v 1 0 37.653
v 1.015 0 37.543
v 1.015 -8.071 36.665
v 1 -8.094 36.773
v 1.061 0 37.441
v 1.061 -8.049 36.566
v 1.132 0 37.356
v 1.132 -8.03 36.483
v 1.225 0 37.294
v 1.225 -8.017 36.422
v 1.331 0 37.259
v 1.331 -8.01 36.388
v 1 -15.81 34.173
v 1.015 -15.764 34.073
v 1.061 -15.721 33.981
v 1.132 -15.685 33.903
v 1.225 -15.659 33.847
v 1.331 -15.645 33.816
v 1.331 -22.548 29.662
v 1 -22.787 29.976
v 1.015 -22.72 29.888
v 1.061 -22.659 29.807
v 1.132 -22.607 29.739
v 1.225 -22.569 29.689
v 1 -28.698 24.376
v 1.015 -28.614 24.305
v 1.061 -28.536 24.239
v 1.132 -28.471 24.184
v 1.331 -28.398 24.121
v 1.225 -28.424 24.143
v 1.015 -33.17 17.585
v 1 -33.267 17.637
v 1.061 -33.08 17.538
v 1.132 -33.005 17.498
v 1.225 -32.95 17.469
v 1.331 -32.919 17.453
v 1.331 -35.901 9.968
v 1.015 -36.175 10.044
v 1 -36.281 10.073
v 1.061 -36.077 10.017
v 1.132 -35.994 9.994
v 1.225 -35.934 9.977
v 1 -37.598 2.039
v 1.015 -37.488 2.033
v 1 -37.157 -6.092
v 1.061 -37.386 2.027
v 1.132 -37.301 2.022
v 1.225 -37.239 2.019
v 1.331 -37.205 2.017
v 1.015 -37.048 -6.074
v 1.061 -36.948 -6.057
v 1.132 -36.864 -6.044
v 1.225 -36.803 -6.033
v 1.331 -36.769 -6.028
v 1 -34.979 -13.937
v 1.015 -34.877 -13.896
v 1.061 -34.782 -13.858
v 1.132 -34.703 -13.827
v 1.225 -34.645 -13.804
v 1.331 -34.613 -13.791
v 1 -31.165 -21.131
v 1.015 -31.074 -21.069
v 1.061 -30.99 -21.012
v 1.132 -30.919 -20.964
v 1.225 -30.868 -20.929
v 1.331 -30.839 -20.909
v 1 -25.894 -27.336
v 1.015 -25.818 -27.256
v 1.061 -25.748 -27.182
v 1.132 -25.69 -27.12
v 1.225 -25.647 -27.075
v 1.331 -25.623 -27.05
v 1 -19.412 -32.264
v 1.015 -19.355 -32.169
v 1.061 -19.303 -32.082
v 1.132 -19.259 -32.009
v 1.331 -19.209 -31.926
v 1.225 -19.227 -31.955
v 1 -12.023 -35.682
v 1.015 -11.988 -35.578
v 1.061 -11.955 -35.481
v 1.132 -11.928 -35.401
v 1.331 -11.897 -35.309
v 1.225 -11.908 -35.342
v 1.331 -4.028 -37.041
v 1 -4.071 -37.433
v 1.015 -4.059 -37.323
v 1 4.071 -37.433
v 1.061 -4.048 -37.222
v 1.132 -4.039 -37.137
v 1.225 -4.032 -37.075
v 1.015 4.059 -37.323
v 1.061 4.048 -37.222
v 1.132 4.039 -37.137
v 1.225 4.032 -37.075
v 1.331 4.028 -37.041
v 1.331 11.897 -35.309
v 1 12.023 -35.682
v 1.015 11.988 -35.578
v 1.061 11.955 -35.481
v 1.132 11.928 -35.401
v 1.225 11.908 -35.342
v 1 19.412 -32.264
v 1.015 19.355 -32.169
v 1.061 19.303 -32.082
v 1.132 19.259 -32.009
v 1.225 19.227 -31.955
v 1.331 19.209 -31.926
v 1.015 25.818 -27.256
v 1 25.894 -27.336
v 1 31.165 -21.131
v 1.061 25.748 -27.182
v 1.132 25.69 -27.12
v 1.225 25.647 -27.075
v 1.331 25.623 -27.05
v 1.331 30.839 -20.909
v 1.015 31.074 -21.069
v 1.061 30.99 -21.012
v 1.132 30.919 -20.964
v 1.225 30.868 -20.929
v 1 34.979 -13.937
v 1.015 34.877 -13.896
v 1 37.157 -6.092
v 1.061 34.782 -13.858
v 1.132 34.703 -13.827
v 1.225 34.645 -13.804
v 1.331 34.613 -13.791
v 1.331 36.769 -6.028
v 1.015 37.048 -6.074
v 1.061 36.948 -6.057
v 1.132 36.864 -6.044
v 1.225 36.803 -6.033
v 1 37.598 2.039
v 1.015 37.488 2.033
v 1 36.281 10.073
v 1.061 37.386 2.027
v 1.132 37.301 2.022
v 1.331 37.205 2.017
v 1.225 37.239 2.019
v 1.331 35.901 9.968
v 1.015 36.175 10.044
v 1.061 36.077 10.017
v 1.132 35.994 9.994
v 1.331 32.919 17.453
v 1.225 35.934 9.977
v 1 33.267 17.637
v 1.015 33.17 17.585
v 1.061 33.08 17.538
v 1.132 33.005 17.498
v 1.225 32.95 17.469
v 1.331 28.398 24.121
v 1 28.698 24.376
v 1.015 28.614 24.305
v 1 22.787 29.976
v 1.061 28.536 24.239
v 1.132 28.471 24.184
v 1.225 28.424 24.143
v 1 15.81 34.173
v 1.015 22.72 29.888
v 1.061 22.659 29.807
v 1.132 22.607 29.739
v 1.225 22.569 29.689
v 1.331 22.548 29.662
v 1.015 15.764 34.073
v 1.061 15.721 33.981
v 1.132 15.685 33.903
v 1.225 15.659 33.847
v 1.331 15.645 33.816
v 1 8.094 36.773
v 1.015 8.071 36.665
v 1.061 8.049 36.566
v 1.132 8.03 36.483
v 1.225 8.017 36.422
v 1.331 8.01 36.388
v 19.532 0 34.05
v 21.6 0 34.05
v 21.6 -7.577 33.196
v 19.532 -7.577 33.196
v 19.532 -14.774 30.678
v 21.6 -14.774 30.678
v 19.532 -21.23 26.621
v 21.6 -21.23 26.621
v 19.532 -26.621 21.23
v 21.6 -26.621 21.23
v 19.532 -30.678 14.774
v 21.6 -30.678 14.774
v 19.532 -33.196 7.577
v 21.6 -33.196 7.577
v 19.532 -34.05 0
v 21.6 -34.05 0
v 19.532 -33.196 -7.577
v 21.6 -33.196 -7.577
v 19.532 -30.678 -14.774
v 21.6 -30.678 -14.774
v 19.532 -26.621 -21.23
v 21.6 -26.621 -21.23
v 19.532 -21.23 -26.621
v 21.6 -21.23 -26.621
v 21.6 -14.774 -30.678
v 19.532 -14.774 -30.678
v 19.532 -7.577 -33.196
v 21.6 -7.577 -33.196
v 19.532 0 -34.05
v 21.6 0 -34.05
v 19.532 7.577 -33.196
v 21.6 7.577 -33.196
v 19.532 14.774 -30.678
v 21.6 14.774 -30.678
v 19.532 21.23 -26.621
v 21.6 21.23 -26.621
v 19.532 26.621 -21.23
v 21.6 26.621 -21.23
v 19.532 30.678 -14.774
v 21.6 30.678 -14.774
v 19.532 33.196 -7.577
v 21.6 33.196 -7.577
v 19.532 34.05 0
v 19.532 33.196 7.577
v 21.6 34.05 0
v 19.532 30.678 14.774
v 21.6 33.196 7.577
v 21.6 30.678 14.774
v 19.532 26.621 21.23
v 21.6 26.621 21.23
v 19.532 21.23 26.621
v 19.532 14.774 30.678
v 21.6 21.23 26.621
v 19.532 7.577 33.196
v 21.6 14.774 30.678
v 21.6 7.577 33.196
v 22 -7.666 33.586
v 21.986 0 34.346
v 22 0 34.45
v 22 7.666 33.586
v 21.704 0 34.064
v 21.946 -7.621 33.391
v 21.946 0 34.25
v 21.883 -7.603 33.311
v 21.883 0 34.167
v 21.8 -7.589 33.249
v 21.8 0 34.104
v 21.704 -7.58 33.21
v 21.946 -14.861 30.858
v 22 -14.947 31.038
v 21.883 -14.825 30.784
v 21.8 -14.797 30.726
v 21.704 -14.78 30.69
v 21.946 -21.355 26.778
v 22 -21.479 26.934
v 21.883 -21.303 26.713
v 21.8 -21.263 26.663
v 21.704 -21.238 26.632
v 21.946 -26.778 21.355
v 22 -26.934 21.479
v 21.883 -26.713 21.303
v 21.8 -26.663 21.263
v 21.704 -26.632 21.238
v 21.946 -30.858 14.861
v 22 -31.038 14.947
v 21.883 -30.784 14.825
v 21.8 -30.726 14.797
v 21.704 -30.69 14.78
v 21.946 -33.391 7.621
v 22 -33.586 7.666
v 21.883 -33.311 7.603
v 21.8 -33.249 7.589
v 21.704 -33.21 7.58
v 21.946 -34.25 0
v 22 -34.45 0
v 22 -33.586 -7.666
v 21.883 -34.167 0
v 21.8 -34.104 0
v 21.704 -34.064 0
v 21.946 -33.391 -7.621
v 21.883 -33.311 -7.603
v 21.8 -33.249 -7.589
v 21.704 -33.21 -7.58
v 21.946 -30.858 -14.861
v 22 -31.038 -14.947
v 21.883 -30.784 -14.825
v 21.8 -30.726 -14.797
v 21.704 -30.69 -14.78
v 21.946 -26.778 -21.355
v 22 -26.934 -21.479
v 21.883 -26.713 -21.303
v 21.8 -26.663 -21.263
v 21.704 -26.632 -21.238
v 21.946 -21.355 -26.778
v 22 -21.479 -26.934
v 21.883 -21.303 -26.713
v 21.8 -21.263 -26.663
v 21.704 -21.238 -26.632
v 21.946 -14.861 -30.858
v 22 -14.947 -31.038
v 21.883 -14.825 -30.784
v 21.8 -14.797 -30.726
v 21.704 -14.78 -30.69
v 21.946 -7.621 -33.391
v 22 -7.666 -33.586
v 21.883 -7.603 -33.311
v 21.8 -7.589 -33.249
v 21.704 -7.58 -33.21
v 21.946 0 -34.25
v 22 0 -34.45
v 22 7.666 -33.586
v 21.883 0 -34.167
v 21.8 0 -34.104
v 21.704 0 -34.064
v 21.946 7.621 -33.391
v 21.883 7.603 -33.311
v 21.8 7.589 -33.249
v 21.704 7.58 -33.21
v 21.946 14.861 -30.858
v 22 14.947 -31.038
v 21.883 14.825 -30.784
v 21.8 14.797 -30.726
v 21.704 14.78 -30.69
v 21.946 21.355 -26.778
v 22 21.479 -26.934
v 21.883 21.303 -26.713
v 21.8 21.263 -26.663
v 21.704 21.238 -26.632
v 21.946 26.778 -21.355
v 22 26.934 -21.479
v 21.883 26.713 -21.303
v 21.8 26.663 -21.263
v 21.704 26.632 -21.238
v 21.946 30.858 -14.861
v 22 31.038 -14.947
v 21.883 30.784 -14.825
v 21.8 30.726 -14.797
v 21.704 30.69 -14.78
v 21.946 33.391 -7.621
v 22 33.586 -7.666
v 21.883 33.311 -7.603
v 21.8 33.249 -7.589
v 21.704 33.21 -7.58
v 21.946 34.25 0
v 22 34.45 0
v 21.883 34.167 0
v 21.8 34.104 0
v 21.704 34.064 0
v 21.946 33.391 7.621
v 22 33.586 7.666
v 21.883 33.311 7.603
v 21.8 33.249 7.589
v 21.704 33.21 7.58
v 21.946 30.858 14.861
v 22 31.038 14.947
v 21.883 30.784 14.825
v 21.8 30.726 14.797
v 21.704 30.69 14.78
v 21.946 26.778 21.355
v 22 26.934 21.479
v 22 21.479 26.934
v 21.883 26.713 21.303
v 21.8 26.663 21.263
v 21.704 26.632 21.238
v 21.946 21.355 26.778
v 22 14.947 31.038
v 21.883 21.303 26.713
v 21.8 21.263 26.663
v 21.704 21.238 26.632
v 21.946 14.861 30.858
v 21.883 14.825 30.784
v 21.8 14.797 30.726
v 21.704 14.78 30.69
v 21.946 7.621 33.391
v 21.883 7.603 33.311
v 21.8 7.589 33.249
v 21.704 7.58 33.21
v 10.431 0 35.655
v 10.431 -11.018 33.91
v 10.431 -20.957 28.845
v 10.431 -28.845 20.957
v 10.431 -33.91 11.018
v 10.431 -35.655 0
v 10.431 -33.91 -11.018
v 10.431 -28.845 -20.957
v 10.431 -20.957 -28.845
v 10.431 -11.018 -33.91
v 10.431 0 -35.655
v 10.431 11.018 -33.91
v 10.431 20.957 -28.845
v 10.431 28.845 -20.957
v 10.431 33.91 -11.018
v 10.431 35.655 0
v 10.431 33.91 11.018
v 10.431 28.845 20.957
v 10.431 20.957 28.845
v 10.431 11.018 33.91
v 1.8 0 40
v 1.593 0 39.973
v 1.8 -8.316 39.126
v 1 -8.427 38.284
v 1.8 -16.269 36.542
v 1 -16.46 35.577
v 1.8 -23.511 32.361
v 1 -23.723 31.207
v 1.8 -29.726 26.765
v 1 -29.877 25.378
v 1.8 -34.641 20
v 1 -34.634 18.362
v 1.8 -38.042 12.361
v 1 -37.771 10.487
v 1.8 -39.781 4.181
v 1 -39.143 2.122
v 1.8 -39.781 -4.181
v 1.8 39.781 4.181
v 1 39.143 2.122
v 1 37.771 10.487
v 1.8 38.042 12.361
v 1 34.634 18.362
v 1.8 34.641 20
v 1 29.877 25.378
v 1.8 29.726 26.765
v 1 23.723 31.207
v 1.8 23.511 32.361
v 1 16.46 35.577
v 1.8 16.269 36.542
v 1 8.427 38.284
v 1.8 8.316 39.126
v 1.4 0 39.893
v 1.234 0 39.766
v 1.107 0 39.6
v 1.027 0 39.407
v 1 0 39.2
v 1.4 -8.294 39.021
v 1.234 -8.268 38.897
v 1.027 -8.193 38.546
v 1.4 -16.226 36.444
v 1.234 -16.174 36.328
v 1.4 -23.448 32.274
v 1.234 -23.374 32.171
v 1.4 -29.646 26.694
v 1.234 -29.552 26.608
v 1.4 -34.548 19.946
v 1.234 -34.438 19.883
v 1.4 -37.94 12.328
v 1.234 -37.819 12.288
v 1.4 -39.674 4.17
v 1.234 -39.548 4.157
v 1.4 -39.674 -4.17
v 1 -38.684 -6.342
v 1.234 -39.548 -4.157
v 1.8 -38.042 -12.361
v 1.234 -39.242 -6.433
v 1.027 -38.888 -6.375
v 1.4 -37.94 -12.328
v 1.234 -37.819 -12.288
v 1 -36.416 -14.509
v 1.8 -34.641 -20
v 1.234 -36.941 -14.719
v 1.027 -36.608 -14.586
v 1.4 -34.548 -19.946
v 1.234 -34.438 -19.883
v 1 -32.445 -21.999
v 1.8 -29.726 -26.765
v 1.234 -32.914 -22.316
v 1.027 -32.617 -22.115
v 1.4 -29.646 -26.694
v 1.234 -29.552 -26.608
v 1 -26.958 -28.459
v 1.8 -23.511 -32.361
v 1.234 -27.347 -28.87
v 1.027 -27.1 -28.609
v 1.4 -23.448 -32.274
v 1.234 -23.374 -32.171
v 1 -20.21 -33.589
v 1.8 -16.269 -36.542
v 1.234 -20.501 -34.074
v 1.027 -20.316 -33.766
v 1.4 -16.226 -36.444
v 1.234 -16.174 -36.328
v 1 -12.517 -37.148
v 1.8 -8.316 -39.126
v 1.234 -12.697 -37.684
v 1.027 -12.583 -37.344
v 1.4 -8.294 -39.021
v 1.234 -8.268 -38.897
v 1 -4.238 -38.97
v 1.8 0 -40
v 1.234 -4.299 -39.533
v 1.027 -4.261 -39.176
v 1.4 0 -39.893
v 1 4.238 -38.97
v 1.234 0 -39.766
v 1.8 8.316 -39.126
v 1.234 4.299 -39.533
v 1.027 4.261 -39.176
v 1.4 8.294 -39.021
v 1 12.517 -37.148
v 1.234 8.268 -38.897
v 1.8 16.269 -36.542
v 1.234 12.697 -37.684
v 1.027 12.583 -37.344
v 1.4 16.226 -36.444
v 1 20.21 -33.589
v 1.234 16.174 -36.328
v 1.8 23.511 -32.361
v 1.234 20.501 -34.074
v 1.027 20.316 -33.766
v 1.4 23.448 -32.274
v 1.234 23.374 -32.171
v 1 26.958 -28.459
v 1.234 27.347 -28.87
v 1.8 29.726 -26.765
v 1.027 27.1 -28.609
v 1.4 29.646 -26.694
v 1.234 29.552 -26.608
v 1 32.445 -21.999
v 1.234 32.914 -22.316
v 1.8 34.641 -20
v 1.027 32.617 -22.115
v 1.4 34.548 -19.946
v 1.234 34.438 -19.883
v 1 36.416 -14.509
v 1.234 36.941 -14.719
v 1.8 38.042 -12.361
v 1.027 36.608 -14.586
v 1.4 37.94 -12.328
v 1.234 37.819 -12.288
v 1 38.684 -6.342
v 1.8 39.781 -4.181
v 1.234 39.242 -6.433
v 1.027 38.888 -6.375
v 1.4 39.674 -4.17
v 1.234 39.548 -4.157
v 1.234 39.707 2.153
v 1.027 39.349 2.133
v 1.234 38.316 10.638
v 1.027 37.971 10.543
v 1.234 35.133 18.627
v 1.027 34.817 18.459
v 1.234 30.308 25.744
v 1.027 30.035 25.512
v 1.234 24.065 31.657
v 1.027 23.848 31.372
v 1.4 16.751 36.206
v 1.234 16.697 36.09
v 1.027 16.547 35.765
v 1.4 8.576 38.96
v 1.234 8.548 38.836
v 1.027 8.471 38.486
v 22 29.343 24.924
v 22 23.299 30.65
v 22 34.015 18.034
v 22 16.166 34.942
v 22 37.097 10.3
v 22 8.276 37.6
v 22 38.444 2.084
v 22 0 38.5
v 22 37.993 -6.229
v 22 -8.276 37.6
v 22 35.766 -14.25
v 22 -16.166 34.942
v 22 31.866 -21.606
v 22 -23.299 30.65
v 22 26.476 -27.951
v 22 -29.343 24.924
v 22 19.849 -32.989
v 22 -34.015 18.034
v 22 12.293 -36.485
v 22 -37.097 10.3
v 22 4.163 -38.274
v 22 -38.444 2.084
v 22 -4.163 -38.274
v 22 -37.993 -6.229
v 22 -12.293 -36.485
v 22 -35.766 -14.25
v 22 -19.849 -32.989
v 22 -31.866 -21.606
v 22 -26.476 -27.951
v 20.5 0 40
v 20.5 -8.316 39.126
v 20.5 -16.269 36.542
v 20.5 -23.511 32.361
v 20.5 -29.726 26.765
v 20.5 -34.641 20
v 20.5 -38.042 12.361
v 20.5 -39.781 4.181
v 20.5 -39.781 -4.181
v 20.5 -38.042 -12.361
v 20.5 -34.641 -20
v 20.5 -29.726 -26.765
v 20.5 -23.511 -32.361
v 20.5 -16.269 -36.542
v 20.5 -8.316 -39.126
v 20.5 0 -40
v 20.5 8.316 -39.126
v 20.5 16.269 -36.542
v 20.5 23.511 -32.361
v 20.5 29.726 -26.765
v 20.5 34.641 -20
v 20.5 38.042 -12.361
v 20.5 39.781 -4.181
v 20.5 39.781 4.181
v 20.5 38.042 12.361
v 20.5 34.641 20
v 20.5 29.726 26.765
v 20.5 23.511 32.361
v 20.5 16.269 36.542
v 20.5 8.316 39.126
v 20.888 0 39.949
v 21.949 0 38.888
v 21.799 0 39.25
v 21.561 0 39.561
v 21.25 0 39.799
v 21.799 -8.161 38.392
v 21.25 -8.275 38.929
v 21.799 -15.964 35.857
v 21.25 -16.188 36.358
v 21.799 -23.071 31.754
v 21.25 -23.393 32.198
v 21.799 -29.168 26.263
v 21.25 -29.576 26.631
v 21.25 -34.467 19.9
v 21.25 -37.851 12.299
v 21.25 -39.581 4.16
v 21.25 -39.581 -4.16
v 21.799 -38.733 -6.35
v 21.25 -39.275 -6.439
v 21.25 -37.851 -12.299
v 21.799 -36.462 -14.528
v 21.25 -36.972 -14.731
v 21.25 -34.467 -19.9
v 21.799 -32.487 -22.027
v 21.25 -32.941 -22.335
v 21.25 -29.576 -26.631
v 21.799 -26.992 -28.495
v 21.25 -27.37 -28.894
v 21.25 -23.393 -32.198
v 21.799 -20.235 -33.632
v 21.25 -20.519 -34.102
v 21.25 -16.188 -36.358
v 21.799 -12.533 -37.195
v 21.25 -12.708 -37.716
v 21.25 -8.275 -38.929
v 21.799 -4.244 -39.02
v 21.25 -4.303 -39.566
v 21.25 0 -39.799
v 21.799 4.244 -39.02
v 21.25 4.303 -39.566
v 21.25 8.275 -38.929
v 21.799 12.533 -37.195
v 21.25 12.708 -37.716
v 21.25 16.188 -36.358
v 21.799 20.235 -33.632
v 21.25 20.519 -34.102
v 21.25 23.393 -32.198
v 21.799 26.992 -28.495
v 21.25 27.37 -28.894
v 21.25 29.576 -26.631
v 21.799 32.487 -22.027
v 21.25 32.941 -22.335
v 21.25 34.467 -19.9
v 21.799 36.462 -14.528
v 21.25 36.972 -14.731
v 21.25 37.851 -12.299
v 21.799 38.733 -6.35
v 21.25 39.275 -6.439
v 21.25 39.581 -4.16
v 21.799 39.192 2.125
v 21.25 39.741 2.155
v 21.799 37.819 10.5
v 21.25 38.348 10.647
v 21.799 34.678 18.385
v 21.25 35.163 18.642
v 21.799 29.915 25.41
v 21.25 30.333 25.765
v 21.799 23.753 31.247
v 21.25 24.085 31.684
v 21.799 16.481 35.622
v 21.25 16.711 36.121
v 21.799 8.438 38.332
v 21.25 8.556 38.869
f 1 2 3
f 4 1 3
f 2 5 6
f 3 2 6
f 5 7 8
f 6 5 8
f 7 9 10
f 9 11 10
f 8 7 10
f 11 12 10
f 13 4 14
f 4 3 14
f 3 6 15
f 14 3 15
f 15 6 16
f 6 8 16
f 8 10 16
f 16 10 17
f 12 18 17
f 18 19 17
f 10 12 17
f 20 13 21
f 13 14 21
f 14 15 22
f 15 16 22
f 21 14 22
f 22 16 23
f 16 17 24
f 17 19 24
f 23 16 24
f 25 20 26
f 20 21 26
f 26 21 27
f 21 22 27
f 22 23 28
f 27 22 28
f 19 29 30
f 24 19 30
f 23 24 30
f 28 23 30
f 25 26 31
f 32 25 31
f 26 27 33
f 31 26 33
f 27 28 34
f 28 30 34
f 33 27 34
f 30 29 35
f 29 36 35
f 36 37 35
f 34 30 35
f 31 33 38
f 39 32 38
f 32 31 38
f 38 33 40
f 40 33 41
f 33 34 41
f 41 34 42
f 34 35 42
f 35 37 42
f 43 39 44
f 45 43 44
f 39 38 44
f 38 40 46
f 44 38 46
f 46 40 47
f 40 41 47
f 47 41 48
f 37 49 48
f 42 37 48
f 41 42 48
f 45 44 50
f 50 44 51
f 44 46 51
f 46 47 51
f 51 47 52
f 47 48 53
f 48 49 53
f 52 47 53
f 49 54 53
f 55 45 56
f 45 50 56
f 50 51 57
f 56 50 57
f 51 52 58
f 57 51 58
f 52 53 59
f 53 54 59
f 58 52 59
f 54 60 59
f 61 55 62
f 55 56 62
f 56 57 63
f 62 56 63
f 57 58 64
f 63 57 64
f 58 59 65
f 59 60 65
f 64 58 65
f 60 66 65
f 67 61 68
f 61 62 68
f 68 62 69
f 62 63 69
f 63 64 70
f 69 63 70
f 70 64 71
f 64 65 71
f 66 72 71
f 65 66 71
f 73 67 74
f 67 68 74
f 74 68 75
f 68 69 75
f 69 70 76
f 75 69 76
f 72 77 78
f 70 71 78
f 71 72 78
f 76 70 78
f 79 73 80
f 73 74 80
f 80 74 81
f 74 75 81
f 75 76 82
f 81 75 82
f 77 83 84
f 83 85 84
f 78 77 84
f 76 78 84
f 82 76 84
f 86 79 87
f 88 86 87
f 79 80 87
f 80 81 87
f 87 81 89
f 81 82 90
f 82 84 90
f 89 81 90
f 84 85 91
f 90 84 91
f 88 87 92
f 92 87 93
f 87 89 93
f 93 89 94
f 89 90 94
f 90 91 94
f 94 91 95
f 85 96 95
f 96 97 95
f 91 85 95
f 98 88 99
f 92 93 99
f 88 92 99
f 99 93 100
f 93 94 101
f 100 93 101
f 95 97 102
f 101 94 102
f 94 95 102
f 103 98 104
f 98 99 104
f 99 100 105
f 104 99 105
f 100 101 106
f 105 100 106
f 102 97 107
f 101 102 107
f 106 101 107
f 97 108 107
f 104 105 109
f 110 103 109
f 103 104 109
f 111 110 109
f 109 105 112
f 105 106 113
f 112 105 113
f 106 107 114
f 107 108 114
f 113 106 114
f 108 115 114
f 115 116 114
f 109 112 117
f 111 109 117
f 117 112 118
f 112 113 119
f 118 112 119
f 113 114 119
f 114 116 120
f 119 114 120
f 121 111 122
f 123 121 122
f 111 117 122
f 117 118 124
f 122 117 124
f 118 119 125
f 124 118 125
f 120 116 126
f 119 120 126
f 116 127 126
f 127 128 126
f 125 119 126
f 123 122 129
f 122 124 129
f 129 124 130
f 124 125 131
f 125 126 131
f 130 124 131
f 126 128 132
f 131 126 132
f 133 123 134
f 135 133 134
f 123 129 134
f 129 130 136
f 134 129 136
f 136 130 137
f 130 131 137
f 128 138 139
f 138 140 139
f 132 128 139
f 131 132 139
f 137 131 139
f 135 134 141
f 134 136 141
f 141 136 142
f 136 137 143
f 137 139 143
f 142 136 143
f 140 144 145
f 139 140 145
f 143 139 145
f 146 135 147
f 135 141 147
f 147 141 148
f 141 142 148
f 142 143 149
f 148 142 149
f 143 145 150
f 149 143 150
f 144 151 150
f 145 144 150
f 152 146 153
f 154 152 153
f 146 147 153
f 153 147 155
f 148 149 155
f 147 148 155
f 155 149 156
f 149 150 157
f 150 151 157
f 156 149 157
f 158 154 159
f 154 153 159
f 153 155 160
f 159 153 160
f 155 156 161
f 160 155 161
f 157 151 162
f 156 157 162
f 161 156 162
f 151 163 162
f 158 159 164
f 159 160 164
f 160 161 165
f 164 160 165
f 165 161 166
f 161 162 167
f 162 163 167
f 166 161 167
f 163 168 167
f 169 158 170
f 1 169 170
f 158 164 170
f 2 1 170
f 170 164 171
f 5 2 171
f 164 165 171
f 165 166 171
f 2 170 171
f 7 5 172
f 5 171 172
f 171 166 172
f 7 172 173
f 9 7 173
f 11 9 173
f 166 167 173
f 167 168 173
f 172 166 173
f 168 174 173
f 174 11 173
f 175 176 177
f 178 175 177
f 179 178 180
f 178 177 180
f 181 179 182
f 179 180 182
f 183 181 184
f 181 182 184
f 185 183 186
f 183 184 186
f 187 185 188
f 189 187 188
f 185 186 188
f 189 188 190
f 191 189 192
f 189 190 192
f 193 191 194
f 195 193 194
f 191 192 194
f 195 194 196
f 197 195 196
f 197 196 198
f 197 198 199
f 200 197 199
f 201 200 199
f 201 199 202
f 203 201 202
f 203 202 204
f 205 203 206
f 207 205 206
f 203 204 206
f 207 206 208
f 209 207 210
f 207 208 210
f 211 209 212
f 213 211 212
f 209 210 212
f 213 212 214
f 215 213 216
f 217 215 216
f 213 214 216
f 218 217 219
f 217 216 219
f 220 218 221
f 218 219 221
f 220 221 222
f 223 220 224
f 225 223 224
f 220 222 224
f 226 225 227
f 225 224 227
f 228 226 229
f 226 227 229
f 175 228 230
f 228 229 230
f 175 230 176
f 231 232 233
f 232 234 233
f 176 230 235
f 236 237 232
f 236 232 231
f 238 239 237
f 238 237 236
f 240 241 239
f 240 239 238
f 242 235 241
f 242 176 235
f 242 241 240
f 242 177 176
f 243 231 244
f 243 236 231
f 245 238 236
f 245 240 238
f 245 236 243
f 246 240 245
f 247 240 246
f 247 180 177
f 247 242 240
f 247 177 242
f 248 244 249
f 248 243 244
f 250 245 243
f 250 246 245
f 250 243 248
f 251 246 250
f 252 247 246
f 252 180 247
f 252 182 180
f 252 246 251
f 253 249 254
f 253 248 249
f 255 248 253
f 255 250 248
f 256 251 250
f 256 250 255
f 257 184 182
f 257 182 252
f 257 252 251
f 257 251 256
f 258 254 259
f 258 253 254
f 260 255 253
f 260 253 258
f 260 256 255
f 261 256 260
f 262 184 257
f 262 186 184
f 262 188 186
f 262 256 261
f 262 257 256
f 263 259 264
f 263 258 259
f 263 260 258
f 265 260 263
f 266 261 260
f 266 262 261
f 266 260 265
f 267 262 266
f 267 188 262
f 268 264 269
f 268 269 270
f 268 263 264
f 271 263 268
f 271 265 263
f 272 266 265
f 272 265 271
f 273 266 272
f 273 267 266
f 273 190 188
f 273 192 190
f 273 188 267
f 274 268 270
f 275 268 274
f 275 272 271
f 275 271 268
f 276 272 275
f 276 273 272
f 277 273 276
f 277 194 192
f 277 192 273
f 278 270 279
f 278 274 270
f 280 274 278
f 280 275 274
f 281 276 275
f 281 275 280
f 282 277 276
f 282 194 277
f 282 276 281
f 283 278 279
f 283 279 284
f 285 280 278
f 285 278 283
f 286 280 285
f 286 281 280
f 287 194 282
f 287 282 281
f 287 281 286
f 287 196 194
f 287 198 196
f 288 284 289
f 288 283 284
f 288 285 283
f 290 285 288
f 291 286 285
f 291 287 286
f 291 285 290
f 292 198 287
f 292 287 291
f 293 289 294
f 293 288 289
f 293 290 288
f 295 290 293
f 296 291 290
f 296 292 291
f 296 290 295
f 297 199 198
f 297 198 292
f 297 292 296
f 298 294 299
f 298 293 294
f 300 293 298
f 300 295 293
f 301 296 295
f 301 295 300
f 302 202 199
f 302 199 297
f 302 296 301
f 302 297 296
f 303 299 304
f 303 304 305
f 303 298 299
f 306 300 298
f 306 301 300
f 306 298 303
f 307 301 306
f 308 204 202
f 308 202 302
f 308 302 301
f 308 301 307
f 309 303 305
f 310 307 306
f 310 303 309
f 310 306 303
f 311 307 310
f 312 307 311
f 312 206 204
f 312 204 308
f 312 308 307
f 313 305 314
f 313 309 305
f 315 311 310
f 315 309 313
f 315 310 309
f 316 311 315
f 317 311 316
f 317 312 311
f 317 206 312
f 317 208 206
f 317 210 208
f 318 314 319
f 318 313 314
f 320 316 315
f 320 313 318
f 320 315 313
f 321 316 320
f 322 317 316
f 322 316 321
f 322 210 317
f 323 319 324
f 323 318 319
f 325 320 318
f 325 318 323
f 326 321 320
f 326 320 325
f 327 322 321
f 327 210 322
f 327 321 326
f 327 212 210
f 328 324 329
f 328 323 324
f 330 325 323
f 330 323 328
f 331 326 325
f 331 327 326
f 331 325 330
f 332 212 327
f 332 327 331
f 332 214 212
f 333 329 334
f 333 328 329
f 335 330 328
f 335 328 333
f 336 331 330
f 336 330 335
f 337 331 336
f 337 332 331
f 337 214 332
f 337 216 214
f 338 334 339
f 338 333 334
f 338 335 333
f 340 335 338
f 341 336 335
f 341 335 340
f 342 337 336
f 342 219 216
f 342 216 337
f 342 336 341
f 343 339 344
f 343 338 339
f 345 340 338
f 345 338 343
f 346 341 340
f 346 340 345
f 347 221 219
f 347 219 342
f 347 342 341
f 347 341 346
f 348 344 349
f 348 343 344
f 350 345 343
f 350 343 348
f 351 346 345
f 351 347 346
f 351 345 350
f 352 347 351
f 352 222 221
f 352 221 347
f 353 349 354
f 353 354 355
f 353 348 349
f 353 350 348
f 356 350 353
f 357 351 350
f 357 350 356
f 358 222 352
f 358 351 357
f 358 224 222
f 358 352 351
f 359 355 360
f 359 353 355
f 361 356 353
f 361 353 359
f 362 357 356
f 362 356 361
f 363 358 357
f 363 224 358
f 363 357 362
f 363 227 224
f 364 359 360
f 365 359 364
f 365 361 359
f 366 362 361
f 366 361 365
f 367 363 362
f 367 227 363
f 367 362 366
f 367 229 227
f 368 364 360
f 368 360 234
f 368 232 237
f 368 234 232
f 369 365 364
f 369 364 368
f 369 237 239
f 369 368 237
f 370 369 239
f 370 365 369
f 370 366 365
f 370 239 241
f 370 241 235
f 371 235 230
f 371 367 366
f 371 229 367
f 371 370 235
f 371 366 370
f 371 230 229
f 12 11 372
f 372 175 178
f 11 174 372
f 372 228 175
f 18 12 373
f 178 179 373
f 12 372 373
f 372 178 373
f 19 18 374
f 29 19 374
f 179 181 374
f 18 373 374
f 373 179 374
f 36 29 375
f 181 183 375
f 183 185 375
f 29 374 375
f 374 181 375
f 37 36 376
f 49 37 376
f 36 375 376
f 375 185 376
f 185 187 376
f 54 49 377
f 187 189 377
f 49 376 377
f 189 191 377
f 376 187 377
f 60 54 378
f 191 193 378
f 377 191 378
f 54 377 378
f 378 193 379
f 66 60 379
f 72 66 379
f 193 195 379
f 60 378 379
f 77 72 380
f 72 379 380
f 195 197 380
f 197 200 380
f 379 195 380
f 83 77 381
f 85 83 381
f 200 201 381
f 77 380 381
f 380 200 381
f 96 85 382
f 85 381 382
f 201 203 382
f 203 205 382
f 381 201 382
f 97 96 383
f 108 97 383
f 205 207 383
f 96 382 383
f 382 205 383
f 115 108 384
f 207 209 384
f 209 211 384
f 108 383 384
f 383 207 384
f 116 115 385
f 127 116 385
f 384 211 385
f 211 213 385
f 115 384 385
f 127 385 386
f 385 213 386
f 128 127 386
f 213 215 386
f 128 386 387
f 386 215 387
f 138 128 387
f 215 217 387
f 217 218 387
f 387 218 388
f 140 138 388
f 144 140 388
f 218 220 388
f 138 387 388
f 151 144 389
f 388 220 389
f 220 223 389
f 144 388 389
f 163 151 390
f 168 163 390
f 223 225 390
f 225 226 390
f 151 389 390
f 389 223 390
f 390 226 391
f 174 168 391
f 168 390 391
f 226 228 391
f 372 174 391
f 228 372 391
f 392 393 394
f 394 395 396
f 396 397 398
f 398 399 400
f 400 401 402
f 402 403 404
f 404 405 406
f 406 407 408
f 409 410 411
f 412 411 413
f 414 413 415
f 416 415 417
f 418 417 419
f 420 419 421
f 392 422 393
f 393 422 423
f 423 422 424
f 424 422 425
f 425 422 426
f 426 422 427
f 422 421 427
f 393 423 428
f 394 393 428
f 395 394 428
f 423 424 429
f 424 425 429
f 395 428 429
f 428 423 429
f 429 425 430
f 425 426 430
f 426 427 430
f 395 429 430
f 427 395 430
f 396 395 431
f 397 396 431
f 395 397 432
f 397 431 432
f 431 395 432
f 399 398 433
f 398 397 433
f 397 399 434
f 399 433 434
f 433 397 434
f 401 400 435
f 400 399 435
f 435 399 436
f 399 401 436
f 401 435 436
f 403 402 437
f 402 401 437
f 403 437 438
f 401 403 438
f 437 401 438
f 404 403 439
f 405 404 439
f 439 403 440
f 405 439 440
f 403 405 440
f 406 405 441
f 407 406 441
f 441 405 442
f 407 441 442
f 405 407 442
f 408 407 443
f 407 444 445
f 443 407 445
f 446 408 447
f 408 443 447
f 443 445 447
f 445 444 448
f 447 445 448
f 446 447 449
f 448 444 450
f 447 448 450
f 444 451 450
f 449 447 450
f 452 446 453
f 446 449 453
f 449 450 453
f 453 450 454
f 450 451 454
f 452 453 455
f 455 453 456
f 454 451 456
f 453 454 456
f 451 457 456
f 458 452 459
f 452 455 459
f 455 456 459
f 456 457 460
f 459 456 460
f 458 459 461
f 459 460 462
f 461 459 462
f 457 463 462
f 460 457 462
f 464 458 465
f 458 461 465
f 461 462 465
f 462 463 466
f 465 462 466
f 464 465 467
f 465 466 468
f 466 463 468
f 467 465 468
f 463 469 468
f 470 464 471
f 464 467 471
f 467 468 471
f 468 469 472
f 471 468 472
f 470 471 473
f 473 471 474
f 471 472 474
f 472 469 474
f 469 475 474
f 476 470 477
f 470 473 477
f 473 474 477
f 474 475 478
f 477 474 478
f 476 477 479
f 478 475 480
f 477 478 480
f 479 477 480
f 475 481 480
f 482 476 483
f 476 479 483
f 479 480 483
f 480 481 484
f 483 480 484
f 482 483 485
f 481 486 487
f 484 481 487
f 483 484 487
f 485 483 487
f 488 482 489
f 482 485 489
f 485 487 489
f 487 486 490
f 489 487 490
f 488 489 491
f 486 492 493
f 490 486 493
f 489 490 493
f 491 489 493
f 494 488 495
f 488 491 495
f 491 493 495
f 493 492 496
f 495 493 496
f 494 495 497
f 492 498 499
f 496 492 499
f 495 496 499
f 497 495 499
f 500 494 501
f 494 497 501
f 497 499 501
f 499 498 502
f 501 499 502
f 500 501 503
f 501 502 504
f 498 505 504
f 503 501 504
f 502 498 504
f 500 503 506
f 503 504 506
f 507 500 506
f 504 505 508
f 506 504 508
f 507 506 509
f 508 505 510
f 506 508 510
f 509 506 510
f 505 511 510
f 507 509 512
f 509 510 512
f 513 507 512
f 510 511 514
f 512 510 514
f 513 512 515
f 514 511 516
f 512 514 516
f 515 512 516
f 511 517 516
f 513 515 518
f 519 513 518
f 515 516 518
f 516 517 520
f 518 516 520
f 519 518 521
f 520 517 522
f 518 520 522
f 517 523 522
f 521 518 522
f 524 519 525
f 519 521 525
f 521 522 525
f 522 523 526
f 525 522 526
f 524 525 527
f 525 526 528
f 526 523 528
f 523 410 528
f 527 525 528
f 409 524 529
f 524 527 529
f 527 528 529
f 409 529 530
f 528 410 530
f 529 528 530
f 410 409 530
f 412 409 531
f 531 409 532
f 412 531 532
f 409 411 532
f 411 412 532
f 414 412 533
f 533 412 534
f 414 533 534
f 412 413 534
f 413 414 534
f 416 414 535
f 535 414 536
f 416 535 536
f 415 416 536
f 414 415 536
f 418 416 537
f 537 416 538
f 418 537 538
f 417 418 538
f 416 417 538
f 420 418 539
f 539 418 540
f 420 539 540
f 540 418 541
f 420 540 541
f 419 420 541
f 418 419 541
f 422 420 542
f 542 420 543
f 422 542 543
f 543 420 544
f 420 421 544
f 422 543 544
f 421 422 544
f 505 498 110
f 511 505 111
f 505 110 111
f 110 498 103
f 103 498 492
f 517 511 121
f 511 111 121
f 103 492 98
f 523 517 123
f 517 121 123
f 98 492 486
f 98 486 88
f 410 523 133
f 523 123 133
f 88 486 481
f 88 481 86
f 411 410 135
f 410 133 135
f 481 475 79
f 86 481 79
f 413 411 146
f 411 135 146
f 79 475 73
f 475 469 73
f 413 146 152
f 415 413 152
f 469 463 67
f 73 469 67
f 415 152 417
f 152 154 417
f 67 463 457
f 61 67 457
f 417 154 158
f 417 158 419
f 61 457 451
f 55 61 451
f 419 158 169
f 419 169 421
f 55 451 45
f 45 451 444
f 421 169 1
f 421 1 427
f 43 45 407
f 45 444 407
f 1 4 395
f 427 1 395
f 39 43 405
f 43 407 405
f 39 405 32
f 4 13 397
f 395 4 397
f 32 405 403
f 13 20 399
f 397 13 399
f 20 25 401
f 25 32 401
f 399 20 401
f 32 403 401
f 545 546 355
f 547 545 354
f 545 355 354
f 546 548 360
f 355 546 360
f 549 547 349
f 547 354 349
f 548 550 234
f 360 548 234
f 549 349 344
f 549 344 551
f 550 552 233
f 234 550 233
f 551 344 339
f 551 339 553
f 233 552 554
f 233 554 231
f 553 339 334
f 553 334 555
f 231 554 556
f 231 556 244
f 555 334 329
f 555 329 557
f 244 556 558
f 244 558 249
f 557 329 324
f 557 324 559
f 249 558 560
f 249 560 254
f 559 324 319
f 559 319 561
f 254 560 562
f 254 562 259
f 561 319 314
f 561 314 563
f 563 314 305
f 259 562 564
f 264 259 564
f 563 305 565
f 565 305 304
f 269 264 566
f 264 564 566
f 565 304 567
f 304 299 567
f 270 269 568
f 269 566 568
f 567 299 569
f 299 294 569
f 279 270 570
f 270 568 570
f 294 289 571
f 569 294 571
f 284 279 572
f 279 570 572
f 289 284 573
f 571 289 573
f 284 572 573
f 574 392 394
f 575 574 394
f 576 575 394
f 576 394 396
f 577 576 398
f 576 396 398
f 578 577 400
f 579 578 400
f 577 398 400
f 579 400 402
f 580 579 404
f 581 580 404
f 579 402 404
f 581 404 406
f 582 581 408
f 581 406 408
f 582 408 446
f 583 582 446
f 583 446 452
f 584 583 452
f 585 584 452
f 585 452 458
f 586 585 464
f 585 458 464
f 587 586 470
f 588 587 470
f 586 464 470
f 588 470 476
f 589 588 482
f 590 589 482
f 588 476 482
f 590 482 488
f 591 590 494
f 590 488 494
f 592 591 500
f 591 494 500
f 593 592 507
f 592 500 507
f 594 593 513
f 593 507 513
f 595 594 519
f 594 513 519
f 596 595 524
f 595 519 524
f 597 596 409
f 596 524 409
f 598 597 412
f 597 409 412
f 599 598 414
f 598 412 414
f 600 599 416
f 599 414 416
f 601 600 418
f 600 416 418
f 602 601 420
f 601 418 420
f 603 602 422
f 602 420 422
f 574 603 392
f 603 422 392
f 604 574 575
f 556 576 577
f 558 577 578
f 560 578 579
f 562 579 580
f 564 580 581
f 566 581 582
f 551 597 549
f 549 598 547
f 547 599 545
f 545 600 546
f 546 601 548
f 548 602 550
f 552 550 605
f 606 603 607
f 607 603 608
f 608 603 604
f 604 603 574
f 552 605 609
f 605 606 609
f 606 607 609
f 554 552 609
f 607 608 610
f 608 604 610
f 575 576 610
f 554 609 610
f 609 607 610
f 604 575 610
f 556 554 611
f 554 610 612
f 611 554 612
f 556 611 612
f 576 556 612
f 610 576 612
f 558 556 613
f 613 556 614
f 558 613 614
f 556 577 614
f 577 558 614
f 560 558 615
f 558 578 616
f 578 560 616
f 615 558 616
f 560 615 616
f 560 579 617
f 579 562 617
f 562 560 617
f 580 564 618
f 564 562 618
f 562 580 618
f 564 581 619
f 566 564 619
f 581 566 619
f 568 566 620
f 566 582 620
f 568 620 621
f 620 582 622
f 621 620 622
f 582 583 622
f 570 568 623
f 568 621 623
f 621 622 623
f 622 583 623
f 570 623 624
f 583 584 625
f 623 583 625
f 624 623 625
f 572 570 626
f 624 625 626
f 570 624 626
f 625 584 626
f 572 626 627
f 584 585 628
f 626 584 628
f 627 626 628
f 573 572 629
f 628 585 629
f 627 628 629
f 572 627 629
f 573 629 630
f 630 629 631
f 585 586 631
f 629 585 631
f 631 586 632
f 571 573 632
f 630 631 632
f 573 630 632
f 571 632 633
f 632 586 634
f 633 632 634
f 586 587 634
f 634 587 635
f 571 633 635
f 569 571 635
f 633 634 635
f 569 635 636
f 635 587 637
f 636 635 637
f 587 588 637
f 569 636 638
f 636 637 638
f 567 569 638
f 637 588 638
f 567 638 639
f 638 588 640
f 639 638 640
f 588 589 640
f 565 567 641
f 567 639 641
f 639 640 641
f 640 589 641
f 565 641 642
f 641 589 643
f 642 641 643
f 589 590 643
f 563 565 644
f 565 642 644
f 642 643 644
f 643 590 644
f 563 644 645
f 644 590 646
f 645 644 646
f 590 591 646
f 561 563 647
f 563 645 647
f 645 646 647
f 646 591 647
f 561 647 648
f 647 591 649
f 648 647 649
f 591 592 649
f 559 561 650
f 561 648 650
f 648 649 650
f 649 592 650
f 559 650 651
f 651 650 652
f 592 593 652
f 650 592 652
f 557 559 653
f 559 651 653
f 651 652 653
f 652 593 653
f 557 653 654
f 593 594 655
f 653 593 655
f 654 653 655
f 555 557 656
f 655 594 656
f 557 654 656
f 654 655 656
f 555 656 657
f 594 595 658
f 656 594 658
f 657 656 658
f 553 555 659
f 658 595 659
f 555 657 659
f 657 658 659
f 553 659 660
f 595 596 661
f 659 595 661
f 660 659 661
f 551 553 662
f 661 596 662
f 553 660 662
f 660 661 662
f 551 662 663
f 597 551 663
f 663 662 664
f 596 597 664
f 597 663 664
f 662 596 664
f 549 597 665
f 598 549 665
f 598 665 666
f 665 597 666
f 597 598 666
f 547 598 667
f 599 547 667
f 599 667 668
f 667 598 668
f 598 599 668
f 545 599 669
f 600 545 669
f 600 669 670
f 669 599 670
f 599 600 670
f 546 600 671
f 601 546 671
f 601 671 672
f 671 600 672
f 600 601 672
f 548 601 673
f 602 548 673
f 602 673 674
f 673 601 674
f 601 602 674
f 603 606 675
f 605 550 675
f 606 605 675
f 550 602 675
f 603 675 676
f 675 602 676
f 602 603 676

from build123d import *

# Parameters (mm, degrees)
FILLET1_R = 1.5
FILLET2_R = 0.8
FILLET3_R = 0.4


with BuildPart() as part:
    # Sketch1 → Revolve1 (revolve)
    with BuildSketch(Plane.XY, mode=Mode.PRIVATE) as revolve1_sk:
        Polygon((22, 34.05), (22, 40), (1, 40), (1, 37.317672581), (19.5318921, 34.05), align=None)
    revolve(revolve1_sk.sketch.rotate(Axis((0, 0, 0), (1, 0, 0)), 90), axis=Axis((0, 0, 0), (1, 0, 0)))

    # Fillet1
    fillet1_edges = [part.edges().sort_by_distance(p)[0] for p in [
        (22, 0, -40),
    ]]
    fillet(fillet1_edges, radius=FILLET1_R)

    # Fillet2
    fillet2_edges = [part.edges().sort_by_distance(p)[0] for p in [
        (1, 0, -40),
    ]]
    fillet(fillet2_edges, radius=FILLET2_R)

    # Fillet3
    fillet3_edges = [part.edges().sort_by_distance(p)[0] for p in [
        (22, 0, -34.05),
        (1, 0, -37.317672581),
    ]]
    fillet(fillet3_edges, radius=FILLET3_R)


solid = part.part
